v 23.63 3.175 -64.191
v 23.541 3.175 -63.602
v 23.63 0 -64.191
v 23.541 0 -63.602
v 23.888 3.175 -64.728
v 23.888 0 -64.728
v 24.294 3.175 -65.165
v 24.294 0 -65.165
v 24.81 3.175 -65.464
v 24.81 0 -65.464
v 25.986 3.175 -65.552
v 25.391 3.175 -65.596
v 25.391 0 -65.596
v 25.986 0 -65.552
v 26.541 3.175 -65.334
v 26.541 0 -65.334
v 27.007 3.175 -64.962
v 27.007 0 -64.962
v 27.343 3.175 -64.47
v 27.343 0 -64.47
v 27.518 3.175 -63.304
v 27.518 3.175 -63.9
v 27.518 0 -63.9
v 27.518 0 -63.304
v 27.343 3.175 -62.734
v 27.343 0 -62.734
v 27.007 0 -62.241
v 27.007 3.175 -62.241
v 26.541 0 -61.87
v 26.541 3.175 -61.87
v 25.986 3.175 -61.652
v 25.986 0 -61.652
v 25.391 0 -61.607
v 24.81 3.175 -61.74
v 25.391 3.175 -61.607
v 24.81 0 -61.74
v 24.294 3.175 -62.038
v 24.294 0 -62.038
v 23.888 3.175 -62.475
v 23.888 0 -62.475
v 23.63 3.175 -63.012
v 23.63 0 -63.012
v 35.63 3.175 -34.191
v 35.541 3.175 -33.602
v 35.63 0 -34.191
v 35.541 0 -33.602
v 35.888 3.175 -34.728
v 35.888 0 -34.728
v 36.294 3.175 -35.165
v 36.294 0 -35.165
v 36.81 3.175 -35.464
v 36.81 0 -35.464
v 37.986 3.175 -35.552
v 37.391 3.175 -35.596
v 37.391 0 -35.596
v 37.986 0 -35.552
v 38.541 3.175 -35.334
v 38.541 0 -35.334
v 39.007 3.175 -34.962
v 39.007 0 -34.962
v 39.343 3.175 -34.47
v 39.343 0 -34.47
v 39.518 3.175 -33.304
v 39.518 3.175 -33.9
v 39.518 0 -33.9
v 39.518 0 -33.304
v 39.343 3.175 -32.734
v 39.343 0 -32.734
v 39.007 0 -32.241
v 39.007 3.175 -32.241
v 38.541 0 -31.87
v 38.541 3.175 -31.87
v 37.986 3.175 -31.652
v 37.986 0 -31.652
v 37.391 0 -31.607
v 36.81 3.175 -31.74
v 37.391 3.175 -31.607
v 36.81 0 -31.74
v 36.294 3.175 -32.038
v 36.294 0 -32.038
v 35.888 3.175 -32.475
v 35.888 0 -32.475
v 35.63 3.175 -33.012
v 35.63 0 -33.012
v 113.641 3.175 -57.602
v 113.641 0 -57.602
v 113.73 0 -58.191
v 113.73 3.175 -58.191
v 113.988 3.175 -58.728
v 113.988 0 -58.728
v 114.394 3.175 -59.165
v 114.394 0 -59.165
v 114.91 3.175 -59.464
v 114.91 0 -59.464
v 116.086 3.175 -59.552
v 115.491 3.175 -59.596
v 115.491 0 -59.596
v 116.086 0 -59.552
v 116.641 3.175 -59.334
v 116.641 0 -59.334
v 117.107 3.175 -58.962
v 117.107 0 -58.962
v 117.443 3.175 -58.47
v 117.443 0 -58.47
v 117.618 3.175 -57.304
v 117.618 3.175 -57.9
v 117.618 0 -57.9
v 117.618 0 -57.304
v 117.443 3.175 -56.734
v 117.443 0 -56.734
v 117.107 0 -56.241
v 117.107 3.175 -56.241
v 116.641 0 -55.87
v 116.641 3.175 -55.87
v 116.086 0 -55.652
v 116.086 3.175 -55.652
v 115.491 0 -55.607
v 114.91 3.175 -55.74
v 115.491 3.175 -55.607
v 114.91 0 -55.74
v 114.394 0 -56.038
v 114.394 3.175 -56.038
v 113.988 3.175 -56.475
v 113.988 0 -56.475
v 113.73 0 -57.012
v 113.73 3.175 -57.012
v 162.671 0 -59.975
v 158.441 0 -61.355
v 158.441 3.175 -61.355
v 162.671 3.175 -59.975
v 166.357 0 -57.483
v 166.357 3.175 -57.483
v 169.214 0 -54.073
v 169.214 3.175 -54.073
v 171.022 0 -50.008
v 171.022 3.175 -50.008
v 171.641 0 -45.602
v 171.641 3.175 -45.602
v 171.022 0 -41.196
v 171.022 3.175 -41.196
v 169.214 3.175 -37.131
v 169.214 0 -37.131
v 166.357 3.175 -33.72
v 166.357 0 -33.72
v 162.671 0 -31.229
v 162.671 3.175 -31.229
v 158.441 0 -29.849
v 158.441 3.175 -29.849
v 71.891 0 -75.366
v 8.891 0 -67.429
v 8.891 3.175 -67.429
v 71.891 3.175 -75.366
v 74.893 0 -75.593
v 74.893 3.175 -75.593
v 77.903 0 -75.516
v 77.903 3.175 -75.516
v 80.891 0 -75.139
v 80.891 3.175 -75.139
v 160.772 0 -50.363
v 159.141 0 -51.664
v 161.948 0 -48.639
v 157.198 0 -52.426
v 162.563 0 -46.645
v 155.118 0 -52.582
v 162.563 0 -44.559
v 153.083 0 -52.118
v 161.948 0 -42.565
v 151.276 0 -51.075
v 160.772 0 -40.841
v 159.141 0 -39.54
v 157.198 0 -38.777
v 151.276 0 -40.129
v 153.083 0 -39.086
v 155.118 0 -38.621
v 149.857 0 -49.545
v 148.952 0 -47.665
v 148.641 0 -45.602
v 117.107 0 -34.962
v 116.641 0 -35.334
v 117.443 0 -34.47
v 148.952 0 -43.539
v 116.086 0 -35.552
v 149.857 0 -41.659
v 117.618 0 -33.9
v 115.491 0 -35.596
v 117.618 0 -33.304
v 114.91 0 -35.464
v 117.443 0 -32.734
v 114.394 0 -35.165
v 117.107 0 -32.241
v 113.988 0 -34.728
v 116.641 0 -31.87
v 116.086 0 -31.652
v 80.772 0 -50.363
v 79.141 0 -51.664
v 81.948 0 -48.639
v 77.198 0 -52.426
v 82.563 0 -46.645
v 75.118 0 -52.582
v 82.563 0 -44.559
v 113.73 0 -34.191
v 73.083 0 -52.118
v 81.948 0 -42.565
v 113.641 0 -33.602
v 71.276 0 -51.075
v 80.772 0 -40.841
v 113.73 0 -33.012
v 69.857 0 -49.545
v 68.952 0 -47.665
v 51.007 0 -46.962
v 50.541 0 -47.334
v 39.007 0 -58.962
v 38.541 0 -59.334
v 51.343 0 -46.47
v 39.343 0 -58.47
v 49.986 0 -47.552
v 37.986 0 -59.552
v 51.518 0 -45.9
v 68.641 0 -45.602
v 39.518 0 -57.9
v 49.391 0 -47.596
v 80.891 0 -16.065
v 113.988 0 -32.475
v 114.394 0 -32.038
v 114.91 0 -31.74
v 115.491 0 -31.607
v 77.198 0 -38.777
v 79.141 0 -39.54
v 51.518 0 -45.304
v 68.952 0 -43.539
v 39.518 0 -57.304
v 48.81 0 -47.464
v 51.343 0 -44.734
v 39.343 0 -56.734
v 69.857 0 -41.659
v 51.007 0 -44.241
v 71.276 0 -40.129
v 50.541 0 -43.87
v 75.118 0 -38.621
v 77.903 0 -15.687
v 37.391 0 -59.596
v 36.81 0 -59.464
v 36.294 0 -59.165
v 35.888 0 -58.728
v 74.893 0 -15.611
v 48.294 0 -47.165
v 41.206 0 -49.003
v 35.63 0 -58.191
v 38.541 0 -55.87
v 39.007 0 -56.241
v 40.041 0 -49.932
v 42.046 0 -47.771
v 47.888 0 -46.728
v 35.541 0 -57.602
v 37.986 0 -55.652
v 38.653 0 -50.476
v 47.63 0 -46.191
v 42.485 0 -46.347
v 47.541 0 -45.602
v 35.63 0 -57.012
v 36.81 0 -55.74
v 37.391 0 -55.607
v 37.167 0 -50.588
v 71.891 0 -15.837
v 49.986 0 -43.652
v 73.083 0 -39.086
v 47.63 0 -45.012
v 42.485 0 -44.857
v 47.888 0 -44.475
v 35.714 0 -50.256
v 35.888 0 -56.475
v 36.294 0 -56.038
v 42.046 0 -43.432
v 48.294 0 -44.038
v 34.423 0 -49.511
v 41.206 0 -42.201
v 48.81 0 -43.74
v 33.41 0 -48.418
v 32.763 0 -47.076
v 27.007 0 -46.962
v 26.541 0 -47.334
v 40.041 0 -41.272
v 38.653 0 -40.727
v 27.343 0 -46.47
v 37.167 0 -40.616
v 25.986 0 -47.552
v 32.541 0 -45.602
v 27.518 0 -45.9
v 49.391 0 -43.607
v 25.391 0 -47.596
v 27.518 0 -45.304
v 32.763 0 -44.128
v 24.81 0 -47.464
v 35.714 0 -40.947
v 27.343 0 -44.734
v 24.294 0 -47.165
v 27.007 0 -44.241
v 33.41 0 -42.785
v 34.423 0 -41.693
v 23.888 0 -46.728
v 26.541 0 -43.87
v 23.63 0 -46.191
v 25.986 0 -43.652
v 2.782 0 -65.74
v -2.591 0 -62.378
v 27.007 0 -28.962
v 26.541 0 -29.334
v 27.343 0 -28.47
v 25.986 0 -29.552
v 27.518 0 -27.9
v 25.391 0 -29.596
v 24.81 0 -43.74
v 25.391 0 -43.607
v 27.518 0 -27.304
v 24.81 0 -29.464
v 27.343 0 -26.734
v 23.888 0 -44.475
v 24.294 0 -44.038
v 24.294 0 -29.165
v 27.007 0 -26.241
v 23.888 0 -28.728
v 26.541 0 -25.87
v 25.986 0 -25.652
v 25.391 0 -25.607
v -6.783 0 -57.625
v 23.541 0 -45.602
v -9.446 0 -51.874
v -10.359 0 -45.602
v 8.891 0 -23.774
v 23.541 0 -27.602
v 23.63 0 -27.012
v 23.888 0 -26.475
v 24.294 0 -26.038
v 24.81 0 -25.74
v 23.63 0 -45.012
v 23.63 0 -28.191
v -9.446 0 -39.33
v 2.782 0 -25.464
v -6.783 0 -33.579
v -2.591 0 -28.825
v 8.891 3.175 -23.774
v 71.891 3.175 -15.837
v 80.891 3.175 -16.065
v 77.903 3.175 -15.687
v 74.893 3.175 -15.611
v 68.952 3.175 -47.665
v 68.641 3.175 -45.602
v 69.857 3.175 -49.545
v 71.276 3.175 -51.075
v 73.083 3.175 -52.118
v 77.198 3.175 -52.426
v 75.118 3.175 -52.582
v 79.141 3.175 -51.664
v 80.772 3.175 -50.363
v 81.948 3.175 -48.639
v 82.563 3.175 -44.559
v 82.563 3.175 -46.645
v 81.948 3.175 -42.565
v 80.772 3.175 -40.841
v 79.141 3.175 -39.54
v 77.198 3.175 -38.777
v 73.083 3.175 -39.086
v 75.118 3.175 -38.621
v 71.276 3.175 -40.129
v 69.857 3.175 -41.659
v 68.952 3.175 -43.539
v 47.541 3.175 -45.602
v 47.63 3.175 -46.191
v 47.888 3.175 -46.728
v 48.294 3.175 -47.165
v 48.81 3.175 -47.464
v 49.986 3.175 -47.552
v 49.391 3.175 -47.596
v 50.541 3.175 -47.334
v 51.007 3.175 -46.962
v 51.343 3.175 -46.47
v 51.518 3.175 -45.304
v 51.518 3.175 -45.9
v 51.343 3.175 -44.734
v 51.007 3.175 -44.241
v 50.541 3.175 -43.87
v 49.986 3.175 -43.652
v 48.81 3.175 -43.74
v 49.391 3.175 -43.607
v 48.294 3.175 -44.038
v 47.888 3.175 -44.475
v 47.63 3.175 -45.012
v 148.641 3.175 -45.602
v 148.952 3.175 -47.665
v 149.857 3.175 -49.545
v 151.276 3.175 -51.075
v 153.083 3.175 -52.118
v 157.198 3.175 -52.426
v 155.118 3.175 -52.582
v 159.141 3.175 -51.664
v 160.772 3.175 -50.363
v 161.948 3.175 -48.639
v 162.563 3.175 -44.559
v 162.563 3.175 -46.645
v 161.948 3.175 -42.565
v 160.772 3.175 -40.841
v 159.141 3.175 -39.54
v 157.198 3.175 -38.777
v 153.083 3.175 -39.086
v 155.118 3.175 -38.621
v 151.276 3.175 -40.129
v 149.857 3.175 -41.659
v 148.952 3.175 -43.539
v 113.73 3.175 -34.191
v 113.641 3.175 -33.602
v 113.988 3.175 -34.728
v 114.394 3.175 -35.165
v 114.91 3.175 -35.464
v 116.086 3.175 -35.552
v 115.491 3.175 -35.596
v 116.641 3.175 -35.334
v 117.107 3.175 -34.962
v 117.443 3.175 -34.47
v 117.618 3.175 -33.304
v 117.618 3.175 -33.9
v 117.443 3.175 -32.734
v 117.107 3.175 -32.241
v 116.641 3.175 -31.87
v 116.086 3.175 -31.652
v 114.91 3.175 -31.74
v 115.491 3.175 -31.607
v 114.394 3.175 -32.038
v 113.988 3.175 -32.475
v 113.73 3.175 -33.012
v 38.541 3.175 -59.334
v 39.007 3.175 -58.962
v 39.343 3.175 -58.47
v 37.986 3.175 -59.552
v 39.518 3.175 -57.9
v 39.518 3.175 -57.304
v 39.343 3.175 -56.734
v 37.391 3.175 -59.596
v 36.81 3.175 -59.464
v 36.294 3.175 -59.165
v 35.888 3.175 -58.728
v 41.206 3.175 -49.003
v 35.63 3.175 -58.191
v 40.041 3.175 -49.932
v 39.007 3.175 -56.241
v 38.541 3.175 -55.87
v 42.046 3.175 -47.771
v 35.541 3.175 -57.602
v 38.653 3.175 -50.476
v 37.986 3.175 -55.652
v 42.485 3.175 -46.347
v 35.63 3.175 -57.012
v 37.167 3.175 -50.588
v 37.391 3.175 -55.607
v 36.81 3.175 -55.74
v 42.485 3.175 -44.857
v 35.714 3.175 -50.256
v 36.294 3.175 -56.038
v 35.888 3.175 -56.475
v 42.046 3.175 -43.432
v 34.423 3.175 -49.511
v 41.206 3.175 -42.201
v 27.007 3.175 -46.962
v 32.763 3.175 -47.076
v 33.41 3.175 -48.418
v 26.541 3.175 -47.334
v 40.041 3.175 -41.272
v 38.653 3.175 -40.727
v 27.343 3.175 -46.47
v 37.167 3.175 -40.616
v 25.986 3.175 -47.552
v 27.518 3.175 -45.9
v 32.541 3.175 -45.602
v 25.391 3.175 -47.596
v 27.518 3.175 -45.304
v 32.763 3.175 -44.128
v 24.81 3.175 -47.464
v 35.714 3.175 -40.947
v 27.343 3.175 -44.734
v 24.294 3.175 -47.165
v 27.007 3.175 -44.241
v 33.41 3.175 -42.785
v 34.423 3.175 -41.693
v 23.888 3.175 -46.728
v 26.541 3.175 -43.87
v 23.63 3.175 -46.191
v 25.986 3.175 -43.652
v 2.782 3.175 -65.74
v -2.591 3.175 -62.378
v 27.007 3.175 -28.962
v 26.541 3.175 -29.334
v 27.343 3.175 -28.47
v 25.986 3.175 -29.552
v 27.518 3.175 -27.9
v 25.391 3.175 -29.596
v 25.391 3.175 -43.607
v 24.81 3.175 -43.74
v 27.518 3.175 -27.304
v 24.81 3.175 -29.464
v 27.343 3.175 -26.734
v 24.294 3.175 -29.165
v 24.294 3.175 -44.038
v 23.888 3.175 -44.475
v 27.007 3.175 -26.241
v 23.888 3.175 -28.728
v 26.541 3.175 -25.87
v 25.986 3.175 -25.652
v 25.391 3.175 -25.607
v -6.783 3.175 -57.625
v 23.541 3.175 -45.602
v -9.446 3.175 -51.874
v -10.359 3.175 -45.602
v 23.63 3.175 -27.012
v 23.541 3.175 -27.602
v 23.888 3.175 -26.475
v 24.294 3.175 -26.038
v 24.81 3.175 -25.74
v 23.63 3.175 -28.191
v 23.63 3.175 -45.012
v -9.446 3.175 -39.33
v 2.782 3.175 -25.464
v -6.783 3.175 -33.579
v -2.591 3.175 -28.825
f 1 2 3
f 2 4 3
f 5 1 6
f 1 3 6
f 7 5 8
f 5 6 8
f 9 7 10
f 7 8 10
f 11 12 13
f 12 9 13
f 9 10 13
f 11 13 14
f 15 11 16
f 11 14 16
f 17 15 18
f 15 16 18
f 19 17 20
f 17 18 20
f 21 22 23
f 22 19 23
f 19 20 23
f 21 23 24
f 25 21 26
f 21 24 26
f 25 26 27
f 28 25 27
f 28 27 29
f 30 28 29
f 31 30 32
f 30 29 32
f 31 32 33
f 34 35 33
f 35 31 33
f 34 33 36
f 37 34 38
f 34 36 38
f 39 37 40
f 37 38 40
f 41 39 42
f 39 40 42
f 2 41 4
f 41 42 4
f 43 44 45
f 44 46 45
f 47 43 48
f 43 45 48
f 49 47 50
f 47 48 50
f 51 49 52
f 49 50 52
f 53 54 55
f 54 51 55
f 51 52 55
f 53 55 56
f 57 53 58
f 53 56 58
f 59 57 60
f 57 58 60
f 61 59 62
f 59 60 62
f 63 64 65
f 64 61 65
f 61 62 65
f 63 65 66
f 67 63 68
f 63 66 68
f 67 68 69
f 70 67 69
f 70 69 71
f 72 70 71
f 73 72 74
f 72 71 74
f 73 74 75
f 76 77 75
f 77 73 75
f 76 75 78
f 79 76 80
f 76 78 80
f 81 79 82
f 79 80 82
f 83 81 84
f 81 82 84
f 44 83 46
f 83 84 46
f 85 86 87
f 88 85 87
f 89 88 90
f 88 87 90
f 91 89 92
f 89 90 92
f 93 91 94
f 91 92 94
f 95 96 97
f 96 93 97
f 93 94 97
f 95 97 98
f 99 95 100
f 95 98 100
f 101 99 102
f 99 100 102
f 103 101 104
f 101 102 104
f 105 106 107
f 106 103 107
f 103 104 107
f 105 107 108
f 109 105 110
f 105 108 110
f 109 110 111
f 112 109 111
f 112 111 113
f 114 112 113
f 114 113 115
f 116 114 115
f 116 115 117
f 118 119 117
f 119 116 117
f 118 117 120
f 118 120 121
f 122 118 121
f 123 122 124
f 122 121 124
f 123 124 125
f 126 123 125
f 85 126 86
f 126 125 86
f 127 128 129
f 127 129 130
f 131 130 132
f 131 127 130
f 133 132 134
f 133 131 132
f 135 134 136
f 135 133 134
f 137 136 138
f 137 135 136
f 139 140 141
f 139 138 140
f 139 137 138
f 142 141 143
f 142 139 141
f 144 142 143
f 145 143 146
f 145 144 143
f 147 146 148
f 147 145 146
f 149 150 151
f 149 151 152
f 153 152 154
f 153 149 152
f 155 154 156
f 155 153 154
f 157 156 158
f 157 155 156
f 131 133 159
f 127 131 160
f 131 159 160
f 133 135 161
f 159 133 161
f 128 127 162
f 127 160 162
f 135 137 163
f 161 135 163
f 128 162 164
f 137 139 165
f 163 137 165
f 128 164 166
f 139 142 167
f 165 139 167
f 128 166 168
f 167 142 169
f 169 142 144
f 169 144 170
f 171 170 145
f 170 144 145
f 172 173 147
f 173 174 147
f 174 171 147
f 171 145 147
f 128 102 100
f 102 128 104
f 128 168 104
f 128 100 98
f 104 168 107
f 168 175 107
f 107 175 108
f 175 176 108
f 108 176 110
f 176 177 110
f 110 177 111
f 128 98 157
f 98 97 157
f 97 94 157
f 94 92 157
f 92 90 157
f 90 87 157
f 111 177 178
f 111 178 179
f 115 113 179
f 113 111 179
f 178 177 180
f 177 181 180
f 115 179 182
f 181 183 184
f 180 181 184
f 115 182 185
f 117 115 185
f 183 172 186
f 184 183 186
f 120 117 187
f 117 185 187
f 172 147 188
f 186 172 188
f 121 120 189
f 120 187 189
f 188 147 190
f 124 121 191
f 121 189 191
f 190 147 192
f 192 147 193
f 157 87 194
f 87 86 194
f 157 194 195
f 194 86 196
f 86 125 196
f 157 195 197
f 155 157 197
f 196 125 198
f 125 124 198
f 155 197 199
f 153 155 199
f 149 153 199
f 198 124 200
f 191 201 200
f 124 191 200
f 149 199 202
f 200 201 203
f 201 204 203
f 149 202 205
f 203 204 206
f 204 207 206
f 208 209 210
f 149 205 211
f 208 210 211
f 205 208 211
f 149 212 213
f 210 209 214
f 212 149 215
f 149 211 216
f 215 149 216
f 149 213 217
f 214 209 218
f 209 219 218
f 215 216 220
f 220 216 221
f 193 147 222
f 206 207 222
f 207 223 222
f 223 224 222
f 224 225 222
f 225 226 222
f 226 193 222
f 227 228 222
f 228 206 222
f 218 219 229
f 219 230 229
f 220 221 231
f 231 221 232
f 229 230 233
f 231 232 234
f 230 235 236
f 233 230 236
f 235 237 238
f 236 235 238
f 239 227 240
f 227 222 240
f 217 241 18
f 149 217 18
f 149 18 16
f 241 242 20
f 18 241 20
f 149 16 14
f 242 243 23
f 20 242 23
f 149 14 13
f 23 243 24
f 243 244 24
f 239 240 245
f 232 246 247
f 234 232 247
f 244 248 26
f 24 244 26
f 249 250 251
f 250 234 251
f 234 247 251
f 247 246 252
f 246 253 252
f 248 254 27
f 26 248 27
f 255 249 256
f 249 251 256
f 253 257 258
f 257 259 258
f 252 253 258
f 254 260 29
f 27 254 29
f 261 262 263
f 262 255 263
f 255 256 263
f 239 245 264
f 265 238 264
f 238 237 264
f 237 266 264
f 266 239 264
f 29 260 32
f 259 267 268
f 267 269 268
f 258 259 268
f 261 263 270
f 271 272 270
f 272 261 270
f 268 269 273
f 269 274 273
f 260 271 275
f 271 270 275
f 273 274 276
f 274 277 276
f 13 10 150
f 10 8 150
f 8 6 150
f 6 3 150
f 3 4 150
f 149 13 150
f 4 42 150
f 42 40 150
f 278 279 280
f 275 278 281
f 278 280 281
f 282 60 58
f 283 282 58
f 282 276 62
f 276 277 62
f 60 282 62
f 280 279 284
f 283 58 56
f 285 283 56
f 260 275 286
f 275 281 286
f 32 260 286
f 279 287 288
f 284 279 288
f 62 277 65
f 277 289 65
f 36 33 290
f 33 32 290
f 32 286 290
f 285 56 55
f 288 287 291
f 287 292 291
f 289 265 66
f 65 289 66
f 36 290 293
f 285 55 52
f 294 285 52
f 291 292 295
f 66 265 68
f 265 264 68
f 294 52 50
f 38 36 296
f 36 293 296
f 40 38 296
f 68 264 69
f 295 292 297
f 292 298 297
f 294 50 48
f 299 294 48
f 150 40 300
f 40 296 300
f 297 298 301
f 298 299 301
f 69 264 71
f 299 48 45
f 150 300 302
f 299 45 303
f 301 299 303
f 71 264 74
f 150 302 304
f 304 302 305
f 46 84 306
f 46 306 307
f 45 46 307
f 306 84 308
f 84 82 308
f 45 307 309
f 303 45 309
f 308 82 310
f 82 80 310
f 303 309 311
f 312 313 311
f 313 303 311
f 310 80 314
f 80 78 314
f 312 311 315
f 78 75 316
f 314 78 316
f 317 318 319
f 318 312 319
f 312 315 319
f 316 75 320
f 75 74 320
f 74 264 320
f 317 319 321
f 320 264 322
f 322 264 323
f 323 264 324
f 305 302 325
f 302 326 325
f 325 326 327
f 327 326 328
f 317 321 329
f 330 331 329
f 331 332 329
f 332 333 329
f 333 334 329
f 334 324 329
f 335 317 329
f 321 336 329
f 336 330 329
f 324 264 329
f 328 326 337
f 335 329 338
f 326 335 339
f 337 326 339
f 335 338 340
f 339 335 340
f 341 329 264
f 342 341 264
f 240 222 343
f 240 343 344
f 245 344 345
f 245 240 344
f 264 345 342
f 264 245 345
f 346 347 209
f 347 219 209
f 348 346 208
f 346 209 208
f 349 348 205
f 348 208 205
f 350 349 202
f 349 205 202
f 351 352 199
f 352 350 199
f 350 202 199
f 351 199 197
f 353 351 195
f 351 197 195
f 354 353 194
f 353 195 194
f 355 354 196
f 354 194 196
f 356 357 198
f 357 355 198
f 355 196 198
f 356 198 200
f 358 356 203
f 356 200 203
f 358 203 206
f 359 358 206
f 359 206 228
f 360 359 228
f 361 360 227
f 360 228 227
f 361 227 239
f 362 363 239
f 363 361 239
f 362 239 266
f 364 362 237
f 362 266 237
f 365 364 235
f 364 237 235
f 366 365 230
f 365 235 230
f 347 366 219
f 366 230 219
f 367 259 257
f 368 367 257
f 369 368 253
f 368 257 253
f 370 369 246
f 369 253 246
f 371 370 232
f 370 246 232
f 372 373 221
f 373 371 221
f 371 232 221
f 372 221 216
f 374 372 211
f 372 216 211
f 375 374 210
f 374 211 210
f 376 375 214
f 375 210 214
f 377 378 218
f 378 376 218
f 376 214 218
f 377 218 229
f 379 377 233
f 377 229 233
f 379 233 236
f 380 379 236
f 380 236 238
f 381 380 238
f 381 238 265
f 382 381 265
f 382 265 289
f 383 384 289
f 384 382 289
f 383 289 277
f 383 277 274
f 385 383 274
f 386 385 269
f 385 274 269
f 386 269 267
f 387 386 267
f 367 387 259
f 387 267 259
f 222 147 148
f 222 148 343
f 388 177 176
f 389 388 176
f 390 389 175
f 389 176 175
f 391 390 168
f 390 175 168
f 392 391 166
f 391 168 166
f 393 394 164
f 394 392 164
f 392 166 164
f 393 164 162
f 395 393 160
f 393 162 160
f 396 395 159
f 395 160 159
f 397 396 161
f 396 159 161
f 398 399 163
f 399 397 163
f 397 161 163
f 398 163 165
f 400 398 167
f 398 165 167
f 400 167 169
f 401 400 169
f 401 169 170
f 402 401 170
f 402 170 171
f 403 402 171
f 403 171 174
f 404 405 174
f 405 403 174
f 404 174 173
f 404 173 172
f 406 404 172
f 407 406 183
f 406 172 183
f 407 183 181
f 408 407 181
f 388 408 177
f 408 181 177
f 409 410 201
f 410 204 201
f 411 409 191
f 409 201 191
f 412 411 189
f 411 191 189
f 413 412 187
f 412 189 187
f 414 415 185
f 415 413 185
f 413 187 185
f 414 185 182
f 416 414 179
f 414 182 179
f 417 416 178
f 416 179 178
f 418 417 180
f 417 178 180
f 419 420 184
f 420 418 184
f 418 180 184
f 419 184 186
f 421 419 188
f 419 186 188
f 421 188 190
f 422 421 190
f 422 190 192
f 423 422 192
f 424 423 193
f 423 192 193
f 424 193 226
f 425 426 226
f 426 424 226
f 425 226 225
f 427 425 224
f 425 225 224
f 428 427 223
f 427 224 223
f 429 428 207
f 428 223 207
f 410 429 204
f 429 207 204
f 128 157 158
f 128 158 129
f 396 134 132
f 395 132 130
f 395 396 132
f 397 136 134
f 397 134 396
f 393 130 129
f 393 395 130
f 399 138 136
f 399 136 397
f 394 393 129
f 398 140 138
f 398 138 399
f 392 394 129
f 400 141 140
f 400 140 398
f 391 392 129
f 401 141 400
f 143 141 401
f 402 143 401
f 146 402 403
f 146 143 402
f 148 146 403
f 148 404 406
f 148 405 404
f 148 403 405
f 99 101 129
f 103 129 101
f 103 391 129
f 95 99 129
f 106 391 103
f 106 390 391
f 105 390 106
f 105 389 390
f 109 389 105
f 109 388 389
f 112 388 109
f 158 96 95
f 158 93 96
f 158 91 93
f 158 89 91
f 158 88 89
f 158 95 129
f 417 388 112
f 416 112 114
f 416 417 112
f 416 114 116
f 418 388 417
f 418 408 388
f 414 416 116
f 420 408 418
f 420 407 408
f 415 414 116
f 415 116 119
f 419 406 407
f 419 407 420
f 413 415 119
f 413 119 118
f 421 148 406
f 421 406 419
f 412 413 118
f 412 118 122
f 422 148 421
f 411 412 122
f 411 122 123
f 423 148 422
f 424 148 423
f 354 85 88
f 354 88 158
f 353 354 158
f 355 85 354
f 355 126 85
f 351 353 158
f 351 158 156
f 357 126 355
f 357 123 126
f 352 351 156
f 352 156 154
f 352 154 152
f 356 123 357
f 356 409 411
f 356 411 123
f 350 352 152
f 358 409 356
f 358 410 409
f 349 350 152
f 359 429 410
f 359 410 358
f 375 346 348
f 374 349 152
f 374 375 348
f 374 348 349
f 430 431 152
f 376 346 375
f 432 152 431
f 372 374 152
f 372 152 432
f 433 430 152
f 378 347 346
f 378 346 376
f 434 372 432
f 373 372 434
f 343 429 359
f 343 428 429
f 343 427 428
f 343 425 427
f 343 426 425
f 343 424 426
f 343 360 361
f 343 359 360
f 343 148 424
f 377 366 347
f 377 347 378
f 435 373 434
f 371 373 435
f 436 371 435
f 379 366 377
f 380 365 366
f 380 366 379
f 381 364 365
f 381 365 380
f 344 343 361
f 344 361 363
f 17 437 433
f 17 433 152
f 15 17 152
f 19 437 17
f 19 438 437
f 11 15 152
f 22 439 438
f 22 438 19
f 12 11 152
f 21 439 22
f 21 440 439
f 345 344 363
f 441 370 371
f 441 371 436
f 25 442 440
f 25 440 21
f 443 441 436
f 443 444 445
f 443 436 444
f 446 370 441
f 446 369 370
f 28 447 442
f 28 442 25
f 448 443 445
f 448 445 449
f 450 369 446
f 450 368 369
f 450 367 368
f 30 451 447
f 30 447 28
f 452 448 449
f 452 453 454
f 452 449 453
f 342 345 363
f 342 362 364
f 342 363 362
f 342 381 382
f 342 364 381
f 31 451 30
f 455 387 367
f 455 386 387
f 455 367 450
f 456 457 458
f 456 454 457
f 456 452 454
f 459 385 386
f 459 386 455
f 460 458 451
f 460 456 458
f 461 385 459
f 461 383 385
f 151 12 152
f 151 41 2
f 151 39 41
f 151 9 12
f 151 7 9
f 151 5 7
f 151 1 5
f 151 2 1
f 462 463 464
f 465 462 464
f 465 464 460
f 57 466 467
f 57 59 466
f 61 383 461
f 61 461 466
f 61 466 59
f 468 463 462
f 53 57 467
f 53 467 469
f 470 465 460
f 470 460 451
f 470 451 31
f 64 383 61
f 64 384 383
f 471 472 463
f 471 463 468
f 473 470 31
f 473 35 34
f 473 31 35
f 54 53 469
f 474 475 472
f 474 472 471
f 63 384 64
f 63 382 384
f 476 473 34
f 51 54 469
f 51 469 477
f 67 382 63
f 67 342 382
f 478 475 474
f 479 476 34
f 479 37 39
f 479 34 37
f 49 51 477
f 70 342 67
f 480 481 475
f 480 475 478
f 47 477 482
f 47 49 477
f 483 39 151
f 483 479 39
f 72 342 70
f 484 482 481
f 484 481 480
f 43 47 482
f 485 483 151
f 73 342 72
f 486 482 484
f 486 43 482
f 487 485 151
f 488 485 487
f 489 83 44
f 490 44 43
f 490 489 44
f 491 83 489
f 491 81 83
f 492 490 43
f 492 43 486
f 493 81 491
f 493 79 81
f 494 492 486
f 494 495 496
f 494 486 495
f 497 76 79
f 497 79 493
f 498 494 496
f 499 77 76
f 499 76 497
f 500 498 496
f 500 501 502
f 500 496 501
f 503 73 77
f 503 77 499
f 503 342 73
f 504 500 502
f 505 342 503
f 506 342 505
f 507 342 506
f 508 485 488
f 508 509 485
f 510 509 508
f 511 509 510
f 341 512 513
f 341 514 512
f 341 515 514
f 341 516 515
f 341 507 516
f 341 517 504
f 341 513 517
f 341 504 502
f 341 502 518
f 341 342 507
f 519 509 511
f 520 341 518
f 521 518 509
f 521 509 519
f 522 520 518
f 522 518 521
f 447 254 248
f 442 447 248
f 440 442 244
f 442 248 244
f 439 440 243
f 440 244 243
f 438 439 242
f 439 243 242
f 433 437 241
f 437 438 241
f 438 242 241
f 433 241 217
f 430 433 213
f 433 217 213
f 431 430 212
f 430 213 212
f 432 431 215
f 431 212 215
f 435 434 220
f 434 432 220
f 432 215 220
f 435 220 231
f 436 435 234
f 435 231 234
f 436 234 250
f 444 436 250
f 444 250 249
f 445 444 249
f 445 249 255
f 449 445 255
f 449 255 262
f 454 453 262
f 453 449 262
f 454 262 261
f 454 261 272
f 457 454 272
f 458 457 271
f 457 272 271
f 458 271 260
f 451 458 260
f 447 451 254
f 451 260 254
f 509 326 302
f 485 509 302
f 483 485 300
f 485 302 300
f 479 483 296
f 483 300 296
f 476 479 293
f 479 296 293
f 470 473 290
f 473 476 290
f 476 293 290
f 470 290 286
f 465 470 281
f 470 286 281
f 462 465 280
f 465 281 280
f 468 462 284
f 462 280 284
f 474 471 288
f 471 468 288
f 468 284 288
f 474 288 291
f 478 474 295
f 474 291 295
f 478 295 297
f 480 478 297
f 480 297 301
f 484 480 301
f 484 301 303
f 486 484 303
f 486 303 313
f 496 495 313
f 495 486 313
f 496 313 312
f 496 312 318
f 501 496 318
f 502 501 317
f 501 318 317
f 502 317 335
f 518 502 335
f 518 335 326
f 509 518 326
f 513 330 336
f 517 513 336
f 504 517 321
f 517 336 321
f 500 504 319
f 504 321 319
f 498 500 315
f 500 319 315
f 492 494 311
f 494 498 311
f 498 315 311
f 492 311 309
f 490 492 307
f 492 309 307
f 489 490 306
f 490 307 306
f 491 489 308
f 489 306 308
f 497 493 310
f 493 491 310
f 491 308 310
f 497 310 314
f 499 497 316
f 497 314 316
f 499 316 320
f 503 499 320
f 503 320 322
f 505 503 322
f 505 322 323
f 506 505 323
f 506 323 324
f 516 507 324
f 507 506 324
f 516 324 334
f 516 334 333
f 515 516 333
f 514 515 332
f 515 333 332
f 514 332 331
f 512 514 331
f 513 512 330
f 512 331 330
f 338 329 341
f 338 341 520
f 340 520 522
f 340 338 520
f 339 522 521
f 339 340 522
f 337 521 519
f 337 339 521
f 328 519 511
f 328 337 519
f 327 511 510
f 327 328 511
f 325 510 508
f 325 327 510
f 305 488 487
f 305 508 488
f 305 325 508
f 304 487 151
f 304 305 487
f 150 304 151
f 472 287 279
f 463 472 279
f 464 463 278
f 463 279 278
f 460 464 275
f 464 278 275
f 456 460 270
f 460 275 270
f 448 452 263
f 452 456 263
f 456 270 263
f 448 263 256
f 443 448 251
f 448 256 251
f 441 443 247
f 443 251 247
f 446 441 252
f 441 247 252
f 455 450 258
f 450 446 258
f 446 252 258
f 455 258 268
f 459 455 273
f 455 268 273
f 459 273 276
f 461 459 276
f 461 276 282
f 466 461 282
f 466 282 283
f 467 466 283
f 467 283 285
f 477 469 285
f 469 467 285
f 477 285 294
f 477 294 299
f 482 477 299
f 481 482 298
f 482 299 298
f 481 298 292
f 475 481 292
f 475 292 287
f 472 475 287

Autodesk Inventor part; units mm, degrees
ref_plane "YZ Plane" through (0, 0, 0) normal (1, 0, 0) x (0, 1, 0)
ref_plane "XZ Plane" through (0, 0, 0) normal (0, 1, 0) x (-1, 0, 0)
ref_plane "XY Plane" through (0, 0, 0) normal (0, 0, 1) x (1, 0, 0)
sketch "Sketch1" plane through (0, 0, 0) normal (0, 1, 0) x (-1, 0, 0)
  line L0 (62.5322, -45.6018) -> (-188.8149, -45.6018) construction
  arc A0 (-158.4408, -29.8487) -> (-158.4408, -61.3549) centre (-155.6408, -45.6018) ccw
  arc A1 (-8.8908, -67.4293) -> (-8.8908, -23.7744) centre (-11.6408, -45.6018) ccw
  line L1 (-8.8908, -67.4293) -> (-71.8908, -75.3665)
  line L2 (-8.8908, -23.7744) -> (-71.8908, -15.8371)
  line L3 (-80.8908, -75.1389) -> (-158.4408, -61.3549)
  line L4 (-158.4408, -29.8487) -> (-80.8908, -16.0647)
  arc A2 (-80.8908, -75.1389) -> (-71.8908, -75.3665) centre (-75.6408, -45.6018) ccw
  arc A3 (-71.8908, -15.8371) -> (-80.8908, -16.0647) centre (-75.6408, -45.6018) ccw
  circle A4 centre (-155.6408, -45.6018) radius 7
  circle A5 centre (-75.6408, -45.6018) radius 7
  circle A6 centre (-37.5408, -45.6018) radius 12 construction
  circle A7 centre (-25.5408, -45.6018) radius 2
  circle A8 centre (-37.5408, -33.6018) radius 2
  circle A9 centre (-49.5408, -45.6018) radius 2
  circle A10 centre (-37.5408, -57.6018) radius 2
  circle A11 centre (-75.6408, -45.6018) radius 38.1 construction
  circle A12 centre (-155.6408, -45.6018) radius 38.1 construction
  circle A13 centre (-37.5408, -45.6018) radius 5
  circle A14 centre (-11.6408, -45.6018) radius 16 construction
  circle A15 centre (-25.5408, -63.6018) radius 2
  circle A16 centre (-25.5408, -27.6018) radius 2
  circle A17 centre (-115.6408, -57.6018) radius 2
  circle A18 centre (-115.6408, -33.6018) radius 2
  point P0 (0, 0)
  dimension "d9" = 24
  dimension "d16" = 76.2
  dimension "d0" = 32
  dimension "d1" = 44
  dimension "d3" = 80
  dimension "d4" = 64
  dimension "d5" = 14
  dimension "d6" = 14
  dimension "d7" = 30
  dimension "d8" = 30
  dimension "d10" = 4
  dimension "d13" = 360
  dimension "d15" = 12
  dimension "d17" = 76.2
  dimension "d18" = 10
  dimension "d19" = 32
  dimension "d20" = 4
  dimension "d21" = 4
  dimension "d22" = 4
  dimension "d23" = 4
  dimension "d24" = 40
  dimension "d25" = 40
  dimension "d26" = 12
  dimension "d27" = 12
  dimension "d30" = 36
  dimension "d31" = 18
extrude "Extrusion1" add sketch "Sketch1" along normal blind 3.175
properties part number "bottombeanv2"
